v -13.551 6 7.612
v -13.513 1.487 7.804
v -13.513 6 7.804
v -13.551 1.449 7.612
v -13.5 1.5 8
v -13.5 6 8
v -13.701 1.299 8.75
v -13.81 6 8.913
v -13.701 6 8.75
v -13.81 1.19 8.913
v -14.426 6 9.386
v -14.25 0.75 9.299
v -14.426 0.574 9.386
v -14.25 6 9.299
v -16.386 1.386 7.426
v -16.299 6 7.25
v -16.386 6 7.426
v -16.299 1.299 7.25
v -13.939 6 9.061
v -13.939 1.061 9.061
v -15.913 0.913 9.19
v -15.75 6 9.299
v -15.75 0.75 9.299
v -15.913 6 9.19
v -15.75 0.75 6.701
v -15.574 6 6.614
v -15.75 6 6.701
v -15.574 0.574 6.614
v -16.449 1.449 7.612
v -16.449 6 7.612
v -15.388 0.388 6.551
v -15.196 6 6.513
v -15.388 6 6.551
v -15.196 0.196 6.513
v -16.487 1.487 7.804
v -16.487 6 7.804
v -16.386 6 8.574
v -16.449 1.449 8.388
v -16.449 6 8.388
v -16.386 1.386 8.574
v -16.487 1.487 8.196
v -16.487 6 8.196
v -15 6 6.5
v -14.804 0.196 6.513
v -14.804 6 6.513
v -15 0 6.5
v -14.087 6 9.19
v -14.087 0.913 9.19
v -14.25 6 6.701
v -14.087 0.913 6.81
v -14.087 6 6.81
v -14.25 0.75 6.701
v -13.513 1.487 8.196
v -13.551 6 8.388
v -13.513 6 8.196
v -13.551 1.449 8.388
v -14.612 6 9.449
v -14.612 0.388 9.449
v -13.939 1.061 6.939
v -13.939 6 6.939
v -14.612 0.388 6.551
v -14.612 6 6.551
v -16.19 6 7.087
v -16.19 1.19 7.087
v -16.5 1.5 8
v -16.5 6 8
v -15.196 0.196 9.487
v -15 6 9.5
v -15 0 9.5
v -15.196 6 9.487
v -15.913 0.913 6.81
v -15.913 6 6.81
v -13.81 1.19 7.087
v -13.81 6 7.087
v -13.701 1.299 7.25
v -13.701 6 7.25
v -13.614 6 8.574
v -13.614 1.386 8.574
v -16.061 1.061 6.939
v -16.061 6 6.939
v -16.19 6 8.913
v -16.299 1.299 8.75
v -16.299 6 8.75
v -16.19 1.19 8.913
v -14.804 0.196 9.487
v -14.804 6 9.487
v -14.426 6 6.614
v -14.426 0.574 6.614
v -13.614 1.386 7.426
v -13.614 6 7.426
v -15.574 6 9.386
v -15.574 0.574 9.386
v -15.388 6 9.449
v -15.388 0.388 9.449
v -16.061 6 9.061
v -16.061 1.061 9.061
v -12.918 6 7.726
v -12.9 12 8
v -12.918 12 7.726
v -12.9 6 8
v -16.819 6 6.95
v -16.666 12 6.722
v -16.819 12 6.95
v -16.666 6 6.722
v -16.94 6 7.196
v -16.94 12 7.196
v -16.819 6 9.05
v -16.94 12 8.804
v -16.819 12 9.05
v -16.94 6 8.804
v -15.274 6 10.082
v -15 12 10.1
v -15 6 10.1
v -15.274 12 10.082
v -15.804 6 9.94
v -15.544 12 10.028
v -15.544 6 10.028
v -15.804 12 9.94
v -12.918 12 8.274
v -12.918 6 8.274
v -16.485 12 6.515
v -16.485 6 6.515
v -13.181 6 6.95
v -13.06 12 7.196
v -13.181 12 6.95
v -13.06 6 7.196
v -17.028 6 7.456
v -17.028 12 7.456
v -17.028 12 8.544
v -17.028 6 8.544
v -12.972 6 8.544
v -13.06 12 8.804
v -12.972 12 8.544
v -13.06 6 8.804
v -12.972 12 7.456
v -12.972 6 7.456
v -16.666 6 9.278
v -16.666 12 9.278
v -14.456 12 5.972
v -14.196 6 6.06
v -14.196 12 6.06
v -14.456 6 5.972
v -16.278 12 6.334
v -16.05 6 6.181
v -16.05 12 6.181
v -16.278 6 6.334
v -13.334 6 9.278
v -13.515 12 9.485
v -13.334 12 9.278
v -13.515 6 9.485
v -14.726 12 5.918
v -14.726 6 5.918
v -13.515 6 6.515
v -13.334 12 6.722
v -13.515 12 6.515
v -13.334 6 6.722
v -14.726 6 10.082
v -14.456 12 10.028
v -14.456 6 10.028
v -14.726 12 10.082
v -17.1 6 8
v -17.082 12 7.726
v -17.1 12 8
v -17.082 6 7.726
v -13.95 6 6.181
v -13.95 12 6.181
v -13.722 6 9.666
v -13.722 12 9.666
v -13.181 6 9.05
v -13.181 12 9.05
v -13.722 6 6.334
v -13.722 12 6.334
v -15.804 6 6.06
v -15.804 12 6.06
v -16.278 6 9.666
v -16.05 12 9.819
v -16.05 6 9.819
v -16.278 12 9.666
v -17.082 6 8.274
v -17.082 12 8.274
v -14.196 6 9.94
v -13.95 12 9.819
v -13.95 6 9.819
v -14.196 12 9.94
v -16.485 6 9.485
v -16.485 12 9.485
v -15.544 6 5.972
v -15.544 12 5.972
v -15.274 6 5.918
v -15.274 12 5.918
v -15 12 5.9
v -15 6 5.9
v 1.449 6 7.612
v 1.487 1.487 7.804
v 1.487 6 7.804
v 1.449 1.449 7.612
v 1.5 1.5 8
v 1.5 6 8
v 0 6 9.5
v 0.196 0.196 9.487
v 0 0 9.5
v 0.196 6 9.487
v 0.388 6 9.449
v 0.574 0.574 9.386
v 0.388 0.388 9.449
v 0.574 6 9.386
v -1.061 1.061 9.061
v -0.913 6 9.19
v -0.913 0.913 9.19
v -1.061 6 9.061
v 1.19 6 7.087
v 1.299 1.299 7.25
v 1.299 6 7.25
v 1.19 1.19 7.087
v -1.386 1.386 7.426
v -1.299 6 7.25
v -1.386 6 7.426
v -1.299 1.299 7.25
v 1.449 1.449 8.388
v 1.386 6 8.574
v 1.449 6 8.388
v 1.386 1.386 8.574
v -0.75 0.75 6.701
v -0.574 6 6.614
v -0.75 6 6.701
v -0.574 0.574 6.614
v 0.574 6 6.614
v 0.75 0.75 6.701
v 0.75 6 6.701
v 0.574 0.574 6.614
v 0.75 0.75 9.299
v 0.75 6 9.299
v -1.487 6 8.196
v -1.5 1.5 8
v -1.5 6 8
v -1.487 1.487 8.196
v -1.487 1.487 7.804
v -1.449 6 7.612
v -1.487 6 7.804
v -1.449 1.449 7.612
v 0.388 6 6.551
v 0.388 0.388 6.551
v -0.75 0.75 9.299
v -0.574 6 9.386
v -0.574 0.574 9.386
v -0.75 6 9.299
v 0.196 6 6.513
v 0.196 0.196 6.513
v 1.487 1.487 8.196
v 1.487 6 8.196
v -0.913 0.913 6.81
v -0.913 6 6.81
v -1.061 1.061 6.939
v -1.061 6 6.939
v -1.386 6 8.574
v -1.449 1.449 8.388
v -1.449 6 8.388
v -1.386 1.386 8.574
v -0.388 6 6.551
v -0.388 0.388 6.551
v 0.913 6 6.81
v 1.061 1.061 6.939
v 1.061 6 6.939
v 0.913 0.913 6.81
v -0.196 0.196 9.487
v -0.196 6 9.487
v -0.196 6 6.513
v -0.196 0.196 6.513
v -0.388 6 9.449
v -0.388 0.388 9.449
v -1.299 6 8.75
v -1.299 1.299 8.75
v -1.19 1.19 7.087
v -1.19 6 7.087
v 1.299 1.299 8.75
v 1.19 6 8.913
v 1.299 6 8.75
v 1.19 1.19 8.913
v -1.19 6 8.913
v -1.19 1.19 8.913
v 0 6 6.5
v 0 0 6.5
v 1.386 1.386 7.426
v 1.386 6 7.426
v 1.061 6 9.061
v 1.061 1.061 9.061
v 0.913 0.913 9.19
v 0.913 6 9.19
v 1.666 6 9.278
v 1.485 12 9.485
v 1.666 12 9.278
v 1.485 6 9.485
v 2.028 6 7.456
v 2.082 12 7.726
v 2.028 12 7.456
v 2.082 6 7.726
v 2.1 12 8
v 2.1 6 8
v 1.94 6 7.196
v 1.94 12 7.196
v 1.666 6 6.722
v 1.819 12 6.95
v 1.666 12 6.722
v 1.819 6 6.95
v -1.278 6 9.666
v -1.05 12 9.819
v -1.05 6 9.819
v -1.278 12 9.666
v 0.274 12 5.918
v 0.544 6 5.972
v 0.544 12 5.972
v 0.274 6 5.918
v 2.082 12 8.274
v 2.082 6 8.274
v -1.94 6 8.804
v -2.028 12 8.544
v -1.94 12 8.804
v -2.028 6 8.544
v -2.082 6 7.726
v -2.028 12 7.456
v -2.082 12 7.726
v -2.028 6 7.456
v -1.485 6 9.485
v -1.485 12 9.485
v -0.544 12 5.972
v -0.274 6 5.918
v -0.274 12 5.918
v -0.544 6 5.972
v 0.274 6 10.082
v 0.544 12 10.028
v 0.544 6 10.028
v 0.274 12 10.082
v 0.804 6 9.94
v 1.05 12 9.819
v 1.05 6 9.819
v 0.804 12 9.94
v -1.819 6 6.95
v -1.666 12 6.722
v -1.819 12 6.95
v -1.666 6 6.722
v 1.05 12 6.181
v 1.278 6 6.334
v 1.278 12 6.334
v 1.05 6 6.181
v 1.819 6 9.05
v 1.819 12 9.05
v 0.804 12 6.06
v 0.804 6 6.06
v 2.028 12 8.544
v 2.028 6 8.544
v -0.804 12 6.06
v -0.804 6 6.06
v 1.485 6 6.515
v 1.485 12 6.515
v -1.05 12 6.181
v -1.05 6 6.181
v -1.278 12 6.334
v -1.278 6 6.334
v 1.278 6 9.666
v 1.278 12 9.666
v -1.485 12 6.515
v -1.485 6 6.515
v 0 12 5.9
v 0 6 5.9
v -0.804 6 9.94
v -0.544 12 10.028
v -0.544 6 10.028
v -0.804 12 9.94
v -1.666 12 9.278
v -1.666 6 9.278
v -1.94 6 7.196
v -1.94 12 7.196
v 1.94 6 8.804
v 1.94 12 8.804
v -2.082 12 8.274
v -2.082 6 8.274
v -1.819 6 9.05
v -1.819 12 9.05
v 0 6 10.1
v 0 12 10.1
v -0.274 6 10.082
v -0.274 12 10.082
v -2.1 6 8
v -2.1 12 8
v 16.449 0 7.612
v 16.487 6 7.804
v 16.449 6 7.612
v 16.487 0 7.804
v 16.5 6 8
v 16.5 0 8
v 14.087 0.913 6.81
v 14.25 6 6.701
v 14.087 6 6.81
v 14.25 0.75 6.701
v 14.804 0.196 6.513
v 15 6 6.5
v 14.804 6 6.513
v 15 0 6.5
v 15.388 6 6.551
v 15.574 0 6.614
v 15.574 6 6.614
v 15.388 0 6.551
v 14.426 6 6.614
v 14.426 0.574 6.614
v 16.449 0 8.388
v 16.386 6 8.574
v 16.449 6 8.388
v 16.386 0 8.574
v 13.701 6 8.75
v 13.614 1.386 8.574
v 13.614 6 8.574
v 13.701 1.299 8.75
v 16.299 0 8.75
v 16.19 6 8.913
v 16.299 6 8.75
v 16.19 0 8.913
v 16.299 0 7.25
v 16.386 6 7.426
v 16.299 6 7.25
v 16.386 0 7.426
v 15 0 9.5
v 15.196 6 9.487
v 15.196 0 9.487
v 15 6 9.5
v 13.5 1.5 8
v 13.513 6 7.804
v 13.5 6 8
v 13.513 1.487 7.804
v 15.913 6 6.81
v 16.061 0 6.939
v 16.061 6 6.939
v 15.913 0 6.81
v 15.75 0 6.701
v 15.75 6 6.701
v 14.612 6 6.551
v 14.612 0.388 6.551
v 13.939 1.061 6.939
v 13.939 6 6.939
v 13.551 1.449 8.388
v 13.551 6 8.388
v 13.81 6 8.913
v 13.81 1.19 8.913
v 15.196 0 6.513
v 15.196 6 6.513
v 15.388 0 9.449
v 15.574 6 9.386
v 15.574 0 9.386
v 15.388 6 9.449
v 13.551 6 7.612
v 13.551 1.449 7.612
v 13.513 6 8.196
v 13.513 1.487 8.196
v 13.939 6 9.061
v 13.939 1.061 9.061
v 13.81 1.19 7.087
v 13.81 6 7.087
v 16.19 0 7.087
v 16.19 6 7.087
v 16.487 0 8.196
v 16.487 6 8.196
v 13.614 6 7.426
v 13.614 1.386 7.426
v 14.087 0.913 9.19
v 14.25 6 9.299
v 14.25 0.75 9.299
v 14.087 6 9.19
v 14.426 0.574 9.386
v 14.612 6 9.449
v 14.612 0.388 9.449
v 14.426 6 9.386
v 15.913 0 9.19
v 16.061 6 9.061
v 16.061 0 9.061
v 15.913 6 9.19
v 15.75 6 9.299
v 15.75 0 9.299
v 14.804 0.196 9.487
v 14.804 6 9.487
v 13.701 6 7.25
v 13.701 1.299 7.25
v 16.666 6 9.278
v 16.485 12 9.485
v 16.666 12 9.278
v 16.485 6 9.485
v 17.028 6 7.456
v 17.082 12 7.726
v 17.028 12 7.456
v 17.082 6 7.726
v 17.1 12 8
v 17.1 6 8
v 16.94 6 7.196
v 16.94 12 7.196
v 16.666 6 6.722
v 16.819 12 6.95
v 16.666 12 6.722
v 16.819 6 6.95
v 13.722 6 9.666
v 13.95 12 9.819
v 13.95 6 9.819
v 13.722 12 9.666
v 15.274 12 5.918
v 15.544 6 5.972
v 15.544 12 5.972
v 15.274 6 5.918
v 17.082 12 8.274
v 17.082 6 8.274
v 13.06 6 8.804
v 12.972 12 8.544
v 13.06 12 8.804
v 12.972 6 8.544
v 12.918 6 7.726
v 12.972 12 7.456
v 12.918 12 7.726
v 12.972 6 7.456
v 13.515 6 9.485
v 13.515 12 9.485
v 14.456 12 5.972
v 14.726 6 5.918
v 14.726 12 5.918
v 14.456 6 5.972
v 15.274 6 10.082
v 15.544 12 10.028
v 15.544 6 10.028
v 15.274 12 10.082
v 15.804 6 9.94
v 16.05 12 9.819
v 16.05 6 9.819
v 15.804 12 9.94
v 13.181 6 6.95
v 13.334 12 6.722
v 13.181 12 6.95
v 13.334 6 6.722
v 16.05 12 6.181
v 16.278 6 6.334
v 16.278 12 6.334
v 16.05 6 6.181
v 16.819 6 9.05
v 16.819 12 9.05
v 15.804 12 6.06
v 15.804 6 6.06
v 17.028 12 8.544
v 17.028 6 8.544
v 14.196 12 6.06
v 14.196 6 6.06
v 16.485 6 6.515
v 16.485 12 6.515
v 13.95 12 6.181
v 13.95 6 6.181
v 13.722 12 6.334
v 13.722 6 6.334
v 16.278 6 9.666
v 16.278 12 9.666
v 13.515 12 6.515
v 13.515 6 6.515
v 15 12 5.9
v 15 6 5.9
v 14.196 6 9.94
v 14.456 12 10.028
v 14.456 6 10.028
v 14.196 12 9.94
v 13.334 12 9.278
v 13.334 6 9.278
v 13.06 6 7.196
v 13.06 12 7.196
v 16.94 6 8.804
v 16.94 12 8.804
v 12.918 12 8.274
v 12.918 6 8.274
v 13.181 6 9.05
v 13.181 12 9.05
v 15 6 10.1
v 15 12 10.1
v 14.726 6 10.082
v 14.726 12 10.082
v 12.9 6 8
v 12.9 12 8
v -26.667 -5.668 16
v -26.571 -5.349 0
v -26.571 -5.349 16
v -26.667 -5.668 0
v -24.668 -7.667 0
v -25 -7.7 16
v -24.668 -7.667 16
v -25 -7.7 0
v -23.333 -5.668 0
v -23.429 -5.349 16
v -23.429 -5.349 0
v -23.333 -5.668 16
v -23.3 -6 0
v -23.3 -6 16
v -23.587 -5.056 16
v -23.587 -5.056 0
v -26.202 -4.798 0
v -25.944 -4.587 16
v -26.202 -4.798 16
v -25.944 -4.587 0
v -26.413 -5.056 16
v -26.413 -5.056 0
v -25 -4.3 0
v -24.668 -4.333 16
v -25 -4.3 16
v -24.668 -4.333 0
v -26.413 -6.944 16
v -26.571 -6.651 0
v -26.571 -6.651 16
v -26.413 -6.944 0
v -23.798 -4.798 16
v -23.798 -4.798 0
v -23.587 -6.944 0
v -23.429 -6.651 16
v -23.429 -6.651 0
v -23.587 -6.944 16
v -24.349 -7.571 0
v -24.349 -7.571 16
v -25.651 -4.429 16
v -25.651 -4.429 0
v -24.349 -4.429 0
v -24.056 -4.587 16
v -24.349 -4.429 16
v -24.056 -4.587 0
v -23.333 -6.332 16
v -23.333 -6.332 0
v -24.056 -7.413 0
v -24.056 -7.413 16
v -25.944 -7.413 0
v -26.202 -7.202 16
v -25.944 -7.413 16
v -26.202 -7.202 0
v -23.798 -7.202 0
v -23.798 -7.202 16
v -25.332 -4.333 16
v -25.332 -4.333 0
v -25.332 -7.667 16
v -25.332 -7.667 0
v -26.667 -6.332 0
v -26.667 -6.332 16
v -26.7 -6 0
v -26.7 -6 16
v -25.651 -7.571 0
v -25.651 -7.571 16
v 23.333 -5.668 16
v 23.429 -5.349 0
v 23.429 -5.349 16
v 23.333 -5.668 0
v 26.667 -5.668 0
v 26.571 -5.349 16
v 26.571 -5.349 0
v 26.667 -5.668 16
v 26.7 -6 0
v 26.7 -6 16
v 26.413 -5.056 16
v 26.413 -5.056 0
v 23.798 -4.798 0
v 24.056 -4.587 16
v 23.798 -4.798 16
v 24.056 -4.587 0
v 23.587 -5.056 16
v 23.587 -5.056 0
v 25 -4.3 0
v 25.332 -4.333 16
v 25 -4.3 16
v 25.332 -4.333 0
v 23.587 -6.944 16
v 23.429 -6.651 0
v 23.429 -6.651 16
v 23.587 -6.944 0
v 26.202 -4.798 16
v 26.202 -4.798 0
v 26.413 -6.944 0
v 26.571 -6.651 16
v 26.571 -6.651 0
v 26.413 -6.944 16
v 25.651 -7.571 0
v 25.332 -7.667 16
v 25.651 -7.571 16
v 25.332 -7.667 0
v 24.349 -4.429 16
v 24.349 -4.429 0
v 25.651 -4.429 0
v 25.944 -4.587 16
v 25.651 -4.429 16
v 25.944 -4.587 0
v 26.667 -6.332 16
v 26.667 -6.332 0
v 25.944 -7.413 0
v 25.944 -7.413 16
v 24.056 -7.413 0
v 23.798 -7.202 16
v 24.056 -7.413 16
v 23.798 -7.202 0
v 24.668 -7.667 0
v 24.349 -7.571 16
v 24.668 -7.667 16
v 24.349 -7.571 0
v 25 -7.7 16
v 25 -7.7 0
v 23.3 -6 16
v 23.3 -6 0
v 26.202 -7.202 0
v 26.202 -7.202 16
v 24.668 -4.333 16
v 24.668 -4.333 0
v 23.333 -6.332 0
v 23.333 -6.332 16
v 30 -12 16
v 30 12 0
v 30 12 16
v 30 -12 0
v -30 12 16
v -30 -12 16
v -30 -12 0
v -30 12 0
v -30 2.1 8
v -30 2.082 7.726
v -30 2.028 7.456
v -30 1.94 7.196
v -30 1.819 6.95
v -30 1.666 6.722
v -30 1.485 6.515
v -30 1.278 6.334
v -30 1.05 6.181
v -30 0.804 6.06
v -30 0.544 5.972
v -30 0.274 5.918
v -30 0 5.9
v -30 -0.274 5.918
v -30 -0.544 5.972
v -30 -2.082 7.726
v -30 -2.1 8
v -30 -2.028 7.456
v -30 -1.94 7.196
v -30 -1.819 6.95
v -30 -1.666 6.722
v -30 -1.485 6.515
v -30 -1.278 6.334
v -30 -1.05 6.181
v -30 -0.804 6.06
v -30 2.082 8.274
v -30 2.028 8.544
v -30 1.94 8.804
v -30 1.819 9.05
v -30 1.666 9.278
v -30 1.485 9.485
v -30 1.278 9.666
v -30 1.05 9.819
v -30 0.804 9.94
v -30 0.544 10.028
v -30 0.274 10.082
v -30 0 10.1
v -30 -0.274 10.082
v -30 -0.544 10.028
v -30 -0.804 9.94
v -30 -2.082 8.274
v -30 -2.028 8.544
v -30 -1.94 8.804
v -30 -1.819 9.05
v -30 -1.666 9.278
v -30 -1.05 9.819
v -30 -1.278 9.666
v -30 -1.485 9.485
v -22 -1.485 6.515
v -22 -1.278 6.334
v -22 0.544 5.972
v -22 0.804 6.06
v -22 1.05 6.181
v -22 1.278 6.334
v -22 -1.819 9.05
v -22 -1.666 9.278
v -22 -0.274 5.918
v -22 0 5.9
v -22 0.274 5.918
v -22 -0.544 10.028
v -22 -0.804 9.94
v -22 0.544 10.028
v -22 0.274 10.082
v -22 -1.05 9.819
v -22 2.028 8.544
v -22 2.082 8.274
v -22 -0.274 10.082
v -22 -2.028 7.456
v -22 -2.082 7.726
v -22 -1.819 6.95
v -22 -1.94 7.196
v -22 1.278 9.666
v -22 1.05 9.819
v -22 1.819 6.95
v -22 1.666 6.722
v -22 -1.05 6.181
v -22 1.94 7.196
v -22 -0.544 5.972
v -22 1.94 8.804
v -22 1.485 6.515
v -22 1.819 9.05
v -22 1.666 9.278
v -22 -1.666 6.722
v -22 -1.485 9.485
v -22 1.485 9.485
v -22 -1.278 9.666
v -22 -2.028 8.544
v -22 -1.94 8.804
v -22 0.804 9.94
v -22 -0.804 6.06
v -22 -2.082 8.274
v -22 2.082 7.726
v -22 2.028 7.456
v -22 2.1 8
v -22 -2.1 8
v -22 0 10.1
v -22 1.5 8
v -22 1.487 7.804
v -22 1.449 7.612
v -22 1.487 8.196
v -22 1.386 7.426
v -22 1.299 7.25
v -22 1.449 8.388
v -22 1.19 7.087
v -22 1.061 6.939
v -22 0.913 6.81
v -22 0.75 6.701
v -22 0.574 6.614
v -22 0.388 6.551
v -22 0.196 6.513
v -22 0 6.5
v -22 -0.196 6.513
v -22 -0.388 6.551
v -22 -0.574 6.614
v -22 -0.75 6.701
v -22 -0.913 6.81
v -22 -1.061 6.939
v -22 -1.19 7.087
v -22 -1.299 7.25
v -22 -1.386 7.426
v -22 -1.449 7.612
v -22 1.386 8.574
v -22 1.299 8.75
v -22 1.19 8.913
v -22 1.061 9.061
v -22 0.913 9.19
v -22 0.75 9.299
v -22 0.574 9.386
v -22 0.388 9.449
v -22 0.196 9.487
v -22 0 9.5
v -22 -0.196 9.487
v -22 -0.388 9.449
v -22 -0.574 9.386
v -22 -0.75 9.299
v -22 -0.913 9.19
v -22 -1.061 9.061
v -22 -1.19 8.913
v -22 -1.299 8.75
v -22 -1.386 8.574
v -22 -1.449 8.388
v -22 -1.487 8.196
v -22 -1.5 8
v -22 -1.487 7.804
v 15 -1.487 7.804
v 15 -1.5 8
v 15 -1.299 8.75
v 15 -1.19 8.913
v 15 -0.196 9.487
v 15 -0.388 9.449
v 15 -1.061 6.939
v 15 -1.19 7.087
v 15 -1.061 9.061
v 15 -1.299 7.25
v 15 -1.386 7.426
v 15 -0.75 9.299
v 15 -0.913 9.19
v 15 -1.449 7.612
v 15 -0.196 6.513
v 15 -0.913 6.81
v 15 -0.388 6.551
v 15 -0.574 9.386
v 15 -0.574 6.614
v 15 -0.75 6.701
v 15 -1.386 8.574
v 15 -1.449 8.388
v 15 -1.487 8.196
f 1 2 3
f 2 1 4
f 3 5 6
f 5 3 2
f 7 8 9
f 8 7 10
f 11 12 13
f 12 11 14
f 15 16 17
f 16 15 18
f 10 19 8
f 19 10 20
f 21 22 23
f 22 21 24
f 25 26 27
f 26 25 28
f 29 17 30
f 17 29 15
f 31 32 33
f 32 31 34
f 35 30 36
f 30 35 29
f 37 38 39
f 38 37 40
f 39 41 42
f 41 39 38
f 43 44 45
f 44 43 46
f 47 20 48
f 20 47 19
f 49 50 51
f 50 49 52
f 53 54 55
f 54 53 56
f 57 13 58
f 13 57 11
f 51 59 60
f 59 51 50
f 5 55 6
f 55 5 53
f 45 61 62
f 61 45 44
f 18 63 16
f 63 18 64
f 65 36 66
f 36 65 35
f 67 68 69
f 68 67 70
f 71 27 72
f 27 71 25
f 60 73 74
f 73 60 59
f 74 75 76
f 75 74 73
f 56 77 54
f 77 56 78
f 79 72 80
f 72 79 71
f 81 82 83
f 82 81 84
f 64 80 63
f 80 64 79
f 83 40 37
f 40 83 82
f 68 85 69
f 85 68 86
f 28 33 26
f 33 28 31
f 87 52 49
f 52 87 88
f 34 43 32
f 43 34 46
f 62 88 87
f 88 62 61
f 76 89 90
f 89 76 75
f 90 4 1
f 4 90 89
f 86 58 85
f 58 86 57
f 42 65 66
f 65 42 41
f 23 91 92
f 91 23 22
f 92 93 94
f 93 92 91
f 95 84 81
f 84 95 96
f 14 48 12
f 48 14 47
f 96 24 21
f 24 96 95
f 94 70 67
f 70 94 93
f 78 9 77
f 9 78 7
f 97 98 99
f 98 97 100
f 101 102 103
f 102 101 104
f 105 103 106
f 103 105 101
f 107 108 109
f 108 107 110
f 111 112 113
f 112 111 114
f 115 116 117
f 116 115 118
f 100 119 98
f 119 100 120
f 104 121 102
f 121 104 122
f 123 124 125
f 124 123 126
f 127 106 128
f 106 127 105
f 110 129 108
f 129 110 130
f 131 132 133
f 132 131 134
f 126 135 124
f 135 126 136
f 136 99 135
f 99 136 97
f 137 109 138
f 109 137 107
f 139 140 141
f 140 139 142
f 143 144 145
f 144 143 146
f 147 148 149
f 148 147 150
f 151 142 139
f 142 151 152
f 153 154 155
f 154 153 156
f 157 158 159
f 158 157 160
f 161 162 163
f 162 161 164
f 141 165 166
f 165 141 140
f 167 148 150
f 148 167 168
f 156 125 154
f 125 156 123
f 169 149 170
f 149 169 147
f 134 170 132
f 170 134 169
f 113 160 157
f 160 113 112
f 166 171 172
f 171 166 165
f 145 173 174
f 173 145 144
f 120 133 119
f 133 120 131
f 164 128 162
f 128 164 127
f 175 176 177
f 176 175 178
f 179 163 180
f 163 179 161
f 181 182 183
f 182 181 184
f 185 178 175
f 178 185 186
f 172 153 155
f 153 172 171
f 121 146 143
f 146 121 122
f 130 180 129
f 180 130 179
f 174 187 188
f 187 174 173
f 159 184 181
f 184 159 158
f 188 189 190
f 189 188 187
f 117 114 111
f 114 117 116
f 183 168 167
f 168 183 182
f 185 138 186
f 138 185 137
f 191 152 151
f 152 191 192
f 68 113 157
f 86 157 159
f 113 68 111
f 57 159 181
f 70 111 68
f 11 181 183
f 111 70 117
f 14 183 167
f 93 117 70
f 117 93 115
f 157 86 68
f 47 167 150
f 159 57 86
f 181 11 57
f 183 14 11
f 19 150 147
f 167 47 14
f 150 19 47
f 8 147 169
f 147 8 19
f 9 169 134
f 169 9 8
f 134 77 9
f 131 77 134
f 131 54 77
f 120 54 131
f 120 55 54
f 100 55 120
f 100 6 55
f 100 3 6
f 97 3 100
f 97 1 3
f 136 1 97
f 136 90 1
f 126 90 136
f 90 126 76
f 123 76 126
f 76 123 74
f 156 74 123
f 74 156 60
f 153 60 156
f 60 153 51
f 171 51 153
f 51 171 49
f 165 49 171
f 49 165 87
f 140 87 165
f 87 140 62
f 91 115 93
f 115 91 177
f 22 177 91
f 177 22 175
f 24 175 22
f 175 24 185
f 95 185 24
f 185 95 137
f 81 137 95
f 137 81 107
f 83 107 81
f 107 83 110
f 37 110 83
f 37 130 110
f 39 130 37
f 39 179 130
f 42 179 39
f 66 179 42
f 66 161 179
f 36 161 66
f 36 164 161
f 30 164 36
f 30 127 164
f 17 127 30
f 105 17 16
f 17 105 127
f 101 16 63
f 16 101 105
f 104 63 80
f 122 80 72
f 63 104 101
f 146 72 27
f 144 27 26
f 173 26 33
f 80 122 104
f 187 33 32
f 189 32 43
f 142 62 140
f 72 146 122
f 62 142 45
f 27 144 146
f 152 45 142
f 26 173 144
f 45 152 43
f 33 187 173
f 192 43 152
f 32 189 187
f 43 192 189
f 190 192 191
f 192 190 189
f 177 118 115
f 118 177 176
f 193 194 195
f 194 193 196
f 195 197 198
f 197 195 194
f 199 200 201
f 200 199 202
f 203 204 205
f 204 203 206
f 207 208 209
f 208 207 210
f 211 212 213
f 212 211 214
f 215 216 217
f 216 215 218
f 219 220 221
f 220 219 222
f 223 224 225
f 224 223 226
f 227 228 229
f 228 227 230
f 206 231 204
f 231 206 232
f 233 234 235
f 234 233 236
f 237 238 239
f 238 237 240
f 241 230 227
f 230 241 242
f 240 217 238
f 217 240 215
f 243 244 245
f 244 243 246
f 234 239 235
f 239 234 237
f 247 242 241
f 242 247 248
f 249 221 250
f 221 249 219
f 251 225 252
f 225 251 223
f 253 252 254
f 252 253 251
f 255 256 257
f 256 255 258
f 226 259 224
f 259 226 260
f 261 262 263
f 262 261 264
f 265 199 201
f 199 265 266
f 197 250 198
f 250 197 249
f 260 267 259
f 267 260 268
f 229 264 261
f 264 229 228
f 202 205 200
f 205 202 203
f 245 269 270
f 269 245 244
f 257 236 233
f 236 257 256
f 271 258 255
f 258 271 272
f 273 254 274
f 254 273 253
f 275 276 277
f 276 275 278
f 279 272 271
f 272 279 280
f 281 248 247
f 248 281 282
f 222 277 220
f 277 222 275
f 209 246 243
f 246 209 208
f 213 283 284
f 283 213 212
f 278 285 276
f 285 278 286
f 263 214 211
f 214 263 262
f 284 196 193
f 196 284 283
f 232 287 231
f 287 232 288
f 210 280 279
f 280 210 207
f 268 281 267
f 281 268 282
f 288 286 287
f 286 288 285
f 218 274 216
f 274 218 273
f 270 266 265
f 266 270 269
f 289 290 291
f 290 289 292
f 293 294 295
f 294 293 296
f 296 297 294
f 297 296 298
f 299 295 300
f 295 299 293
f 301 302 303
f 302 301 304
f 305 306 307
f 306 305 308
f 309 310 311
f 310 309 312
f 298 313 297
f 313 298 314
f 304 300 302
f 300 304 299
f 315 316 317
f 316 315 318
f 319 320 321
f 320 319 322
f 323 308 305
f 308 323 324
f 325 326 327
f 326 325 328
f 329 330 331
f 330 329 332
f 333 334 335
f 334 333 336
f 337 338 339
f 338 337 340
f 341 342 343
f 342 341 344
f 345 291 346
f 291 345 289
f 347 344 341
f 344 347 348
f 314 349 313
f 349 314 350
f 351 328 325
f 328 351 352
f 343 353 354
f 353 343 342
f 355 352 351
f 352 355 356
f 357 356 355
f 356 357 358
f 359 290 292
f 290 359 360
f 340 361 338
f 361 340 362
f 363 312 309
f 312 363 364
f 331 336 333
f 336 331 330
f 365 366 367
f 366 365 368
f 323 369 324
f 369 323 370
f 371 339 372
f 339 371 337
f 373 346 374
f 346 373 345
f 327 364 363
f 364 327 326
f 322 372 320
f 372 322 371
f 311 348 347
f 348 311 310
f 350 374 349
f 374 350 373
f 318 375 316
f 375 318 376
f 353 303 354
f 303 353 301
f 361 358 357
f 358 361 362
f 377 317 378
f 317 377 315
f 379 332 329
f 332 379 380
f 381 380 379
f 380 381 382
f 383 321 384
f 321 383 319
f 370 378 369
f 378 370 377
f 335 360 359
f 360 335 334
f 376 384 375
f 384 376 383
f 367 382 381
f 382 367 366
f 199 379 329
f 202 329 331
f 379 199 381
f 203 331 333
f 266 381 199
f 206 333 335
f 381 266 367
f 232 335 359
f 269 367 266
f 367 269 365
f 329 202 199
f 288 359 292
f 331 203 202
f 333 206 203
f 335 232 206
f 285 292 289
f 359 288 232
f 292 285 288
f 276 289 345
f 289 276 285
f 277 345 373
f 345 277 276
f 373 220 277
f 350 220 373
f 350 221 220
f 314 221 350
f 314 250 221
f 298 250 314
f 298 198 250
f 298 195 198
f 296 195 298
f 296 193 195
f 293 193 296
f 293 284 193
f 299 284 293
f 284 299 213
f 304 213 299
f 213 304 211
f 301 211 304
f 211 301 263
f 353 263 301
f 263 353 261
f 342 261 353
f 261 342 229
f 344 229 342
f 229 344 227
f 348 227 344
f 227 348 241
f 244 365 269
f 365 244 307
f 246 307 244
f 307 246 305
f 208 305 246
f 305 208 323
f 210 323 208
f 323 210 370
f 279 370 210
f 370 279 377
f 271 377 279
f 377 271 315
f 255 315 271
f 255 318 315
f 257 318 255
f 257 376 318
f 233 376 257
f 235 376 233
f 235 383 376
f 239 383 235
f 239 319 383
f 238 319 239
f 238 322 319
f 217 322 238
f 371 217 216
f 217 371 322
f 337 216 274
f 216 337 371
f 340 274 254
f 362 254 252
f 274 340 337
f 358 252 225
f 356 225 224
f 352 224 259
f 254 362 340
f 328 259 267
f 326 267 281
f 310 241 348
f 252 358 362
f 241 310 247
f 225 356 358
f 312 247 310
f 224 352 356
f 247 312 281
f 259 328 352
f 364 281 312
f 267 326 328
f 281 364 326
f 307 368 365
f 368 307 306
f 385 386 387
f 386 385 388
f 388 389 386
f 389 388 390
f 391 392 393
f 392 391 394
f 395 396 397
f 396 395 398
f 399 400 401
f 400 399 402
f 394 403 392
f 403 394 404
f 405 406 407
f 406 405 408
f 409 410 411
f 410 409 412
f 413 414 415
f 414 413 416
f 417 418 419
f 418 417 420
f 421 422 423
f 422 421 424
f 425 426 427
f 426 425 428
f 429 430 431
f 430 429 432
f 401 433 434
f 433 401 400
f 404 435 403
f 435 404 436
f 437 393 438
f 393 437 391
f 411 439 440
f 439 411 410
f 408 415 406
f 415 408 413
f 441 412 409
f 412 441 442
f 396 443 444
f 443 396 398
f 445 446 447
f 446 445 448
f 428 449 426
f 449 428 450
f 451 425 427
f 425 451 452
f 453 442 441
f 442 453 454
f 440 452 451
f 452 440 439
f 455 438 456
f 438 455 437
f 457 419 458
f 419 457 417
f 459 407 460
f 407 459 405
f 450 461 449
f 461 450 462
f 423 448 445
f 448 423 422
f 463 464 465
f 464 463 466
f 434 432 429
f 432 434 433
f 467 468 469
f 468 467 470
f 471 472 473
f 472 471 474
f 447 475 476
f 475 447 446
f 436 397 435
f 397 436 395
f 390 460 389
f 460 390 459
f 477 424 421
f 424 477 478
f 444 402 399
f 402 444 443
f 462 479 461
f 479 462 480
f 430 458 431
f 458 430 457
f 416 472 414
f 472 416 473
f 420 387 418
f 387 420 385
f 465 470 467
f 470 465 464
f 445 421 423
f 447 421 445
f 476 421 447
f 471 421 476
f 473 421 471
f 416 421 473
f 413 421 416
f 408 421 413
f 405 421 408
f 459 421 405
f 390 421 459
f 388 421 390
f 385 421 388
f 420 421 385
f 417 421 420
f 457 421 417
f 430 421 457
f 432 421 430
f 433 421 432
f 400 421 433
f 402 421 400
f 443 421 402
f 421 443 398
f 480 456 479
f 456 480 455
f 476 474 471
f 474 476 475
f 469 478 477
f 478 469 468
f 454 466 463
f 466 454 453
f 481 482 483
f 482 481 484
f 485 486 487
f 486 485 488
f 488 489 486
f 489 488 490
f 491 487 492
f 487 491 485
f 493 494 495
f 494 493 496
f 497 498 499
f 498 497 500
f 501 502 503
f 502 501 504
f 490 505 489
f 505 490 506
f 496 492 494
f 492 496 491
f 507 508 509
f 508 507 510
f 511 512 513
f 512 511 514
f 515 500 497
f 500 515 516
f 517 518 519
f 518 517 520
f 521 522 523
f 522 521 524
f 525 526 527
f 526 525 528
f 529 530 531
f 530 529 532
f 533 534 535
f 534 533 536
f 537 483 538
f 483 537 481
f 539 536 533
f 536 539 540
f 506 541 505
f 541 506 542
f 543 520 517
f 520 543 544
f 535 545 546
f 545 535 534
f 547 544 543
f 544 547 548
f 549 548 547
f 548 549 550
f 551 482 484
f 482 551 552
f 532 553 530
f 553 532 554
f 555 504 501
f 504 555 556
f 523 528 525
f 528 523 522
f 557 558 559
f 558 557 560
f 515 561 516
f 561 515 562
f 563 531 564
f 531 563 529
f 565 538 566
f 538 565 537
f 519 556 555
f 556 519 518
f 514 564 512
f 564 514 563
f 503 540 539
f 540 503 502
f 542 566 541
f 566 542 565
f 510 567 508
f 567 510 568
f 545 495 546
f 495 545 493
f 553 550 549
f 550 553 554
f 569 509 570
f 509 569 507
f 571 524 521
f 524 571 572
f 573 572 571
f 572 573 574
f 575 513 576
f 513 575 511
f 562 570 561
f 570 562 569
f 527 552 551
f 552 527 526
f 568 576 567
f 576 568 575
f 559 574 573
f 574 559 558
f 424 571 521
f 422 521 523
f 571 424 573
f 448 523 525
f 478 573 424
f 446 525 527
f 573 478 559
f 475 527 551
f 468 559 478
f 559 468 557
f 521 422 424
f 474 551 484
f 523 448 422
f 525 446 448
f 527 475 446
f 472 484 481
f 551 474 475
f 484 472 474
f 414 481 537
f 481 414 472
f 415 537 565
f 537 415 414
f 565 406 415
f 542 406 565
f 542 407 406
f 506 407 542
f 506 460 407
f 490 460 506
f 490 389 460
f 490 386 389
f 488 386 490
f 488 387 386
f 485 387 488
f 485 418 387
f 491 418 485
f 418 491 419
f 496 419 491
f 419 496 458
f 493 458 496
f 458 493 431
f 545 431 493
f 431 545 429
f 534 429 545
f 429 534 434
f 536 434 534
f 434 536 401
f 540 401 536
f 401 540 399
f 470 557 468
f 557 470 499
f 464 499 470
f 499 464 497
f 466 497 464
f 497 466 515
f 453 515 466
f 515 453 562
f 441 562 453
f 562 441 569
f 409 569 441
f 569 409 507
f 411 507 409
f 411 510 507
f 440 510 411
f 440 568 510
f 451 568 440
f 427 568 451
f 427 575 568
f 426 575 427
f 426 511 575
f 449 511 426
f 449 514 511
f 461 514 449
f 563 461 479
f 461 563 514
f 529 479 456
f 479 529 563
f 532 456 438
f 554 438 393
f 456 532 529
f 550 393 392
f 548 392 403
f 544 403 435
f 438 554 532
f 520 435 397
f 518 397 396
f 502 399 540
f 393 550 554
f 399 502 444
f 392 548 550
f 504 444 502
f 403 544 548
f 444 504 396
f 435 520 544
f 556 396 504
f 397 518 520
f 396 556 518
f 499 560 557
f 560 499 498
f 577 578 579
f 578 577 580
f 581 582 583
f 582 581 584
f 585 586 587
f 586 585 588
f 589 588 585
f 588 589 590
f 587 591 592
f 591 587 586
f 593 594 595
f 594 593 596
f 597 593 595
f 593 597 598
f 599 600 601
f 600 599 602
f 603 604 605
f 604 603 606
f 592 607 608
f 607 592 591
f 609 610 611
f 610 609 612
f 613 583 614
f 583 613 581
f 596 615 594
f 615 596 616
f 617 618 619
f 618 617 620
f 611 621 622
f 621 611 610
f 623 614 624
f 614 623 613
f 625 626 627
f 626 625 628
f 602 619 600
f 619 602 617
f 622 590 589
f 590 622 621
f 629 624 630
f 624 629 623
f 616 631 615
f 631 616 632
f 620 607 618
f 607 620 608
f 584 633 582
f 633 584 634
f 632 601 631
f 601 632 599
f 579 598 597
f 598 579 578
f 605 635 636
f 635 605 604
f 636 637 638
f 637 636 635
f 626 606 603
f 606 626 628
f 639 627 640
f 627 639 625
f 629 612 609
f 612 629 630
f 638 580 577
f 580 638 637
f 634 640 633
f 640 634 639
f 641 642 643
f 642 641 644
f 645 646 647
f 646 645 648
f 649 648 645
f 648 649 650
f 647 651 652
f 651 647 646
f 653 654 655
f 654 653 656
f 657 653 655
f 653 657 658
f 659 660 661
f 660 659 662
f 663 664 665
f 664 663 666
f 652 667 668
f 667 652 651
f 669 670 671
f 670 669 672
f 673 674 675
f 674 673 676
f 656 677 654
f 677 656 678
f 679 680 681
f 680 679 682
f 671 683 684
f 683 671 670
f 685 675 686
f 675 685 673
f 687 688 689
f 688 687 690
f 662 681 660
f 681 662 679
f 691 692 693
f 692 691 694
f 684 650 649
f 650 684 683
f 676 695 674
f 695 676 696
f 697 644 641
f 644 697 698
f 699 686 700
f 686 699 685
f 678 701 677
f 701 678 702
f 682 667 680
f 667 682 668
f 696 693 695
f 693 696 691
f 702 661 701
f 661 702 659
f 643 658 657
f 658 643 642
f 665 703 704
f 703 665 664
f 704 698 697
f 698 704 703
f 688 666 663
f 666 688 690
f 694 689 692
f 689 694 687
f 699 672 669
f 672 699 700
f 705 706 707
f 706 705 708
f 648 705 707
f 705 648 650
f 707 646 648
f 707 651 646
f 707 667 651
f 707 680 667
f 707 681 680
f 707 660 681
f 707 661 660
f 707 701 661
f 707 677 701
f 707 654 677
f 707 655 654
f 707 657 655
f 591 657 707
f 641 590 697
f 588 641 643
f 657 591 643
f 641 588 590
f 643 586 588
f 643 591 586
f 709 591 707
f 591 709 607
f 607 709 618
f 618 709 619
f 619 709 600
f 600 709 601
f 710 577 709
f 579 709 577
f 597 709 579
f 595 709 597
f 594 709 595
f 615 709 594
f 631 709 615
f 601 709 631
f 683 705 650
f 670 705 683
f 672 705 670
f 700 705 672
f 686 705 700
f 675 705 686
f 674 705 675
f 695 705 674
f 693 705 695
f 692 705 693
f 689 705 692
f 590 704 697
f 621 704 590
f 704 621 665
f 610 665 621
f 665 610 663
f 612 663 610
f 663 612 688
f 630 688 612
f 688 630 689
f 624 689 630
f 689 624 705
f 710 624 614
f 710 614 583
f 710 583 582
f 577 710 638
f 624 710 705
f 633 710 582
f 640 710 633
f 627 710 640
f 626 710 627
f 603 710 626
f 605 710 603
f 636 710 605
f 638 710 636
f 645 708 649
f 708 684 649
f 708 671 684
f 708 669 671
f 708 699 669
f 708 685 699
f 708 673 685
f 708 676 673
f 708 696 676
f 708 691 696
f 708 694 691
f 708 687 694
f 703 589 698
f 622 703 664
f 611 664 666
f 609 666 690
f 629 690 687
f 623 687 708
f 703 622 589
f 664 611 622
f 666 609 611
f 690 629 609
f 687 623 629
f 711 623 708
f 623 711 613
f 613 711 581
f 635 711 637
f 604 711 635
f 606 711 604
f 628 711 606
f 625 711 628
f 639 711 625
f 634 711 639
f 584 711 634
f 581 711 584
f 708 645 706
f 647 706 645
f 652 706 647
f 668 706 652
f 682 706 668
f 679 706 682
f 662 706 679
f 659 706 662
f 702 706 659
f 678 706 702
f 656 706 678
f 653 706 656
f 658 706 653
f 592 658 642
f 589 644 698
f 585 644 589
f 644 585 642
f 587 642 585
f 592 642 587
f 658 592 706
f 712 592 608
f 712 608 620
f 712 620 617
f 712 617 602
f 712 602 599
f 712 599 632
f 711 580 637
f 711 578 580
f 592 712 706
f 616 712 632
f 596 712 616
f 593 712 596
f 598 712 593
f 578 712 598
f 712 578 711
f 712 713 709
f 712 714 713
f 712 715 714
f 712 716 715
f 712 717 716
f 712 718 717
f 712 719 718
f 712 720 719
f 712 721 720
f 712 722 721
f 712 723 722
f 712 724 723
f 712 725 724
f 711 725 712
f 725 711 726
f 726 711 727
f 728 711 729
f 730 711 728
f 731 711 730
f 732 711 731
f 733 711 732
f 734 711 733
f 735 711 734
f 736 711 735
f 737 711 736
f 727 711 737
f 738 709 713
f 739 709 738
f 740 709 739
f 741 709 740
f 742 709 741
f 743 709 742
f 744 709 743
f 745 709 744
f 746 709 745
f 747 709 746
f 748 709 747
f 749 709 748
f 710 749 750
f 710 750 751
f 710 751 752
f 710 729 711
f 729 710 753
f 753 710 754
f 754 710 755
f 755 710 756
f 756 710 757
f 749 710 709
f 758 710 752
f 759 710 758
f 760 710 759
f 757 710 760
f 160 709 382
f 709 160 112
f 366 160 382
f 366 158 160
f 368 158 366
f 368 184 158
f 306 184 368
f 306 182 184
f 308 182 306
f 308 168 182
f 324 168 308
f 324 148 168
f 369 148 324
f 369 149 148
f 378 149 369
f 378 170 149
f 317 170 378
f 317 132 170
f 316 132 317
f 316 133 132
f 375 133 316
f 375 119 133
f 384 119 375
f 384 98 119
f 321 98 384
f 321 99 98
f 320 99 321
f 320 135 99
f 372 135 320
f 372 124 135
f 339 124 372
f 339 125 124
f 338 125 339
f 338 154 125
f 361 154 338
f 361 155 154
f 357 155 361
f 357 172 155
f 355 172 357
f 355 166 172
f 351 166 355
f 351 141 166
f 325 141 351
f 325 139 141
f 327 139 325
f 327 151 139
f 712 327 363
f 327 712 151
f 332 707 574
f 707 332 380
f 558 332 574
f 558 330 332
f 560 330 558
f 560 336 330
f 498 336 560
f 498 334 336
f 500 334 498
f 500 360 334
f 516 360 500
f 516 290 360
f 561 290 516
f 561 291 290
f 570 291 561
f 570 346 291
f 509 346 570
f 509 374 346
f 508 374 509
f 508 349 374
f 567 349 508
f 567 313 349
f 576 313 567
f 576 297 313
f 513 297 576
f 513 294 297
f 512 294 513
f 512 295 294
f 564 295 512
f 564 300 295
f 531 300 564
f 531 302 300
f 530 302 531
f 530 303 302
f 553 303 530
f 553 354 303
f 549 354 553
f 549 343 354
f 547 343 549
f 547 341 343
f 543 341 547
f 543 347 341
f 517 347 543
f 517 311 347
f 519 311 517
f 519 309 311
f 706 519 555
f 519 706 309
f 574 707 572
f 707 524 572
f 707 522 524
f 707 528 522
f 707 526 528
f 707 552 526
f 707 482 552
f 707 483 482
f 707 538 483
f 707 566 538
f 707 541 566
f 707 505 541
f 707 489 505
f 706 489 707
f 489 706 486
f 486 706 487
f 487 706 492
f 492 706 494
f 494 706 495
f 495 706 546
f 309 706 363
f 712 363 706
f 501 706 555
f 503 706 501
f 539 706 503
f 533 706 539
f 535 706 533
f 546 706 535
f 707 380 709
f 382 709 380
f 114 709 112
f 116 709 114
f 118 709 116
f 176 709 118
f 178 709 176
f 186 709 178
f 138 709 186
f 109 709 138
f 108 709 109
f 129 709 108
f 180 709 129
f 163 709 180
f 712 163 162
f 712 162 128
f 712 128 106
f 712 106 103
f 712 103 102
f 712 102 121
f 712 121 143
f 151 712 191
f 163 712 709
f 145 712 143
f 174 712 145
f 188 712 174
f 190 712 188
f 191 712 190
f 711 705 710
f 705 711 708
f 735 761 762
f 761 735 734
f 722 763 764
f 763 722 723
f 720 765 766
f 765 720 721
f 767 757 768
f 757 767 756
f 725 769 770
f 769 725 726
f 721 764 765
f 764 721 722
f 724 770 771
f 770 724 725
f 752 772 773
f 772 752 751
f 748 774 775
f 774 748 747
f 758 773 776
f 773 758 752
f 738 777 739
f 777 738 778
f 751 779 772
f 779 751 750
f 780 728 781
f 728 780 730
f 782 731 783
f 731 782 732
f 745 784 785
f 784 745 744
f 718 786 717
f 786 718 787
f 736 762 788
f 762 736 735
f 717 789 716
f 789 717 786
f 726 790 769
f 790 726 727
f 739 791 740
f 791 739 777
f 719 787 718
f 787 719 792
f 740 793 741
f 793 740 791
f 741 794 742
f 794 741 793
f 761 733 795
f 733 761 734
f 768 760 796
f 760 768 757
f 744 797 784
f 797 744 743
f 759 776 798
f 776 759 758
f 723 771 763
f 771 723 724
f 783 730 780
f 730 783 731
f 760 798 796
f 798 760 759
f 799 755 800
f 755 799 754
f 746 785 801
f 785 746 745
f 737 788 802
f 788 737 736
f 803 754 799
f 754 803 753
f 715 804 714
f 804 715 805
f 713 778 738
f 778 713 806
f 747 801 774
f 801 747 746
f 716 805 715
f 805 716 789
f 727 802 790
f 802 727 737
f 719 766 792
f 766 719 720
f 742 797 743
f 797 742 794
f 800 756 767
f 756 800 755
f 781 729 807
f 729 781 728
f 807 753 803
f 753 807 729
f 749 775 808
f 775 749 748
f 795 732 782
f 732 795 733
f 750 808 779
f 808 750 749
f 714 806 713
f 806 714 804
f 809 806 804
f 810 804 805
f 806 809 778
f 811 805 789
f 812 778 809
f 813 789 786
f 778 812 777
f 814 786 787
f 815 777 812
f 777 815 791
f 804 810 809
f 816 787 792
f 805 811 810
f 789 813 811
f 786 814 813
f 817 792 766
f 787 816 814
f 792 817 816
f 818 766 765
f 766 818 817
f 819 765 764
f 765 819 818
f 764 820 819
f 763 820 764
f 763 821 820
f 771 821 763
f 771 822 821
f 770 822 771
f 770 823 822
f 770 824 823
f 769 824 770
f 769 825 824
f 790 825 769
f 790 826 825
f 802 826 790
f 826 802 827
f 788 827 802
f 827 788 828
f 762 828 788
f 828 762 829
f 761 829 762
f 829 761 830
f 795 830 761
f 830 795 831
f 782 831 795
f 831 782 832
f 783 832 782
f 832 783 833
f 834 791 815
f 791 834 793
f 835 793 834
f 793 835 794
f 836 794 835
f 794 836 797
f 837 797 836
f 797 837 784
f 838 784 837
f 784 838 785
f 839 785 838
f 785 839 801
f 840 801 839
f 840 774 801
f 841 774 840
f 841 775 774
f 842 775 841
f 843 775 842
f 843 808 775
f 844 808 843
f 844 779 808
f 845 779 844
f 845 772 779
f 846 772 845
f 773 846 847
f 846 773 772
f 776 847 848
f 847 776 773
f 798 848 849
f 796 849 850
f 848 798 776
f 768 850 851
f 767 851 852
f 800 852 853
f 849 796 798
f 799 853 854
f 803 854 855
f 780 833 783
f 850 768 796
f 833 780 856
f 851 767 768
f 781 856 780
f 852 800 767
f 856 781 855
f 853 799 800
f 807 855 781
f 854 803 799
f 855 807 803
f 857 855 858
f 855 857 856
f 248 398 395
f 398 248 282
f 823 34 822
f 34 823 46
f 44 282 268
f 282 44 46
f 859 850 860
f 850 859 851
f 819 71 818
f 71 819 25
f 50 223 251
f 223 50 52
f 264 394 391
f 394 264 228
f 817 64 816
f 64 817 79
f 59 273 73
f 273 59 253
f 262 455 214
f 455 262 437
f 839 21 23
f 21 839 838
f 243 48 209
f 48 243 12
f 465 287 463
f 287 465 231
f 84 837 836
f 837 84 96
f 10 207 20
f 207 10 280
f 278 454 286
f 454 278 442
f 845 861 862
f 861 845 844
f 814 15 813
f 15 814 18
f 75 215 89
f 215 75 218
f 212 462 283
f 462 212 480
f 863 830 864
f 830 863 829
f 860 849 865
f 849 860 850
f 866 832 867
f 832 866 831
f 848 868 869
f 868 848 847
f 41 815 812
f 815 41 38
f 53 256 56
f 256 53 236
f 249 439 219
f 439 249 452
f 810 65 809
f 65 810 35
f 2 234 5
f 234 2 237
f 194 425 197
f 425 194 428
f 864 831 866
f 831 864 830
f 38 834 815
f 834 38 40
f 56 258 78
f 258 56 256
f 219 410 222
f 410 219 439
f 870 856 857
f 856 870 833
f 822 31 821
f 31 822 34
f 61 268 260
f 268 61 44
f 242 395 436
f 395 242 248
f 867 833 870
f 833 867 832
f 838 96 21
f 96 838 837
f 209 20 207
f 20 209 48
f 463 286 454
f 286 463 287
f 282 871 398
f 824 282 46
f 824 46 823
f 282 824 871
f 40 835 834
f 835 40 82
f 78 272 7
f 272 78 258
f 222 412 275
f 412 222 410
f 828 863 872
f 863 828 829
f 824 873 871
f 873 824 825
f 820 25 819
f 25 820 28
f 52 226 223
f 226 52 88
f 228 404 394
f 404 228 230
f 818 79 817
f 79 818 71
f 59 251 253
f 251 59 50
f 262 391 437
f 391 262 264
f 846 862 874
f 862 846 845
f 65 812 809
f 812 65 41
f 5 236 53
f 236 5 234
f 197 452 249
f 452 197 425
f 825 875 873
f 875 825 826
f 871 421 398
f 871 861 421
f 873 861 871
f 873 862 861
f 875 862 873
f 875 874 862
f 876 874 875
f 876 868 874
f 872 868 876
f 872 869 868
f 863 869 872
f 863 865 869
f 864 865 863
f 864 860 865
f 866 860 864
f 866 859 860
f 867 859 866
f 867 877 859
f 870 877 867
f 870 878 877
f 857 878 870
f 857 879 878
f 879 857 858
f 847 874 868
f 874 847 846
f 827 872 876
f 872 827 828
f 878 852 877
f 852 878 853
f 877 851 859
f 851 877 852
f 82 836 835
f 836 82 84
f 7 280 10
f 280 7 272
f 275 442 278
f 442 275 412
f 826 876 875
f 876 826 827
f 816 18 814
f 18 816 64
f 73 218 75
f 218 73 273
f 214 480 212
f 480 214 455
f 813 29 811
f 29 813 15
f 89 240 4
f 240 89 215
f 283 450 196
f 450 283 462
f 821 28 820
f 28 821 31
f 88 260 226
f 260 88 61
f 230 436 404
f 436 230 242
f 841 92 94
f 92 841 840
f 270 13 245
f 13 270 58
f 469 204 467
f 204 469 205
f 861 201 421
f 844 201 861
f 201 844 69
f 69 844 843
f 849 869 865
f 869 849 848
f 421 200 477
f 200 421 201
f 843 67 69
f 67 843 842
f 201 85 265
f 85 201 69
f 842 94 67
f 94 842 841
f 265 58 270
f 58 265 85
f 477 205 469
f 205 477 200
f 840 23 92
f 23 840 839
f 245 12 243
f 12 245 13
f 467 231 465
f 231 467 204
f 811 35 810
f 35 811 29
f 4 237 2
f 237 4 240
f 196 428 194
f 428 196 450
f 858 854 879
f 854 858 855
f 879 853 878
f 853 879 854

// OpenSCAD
// Manifold block: one tubing inlet split into three outlets through internal channels
// Category: hardware. 3 mm channels in the mid-plane: an inlet socket on the -X face feeds a main
// channel that ends inside the block; three branches run to sockets on the +Y face.
// Print: PETG, lying on its bottom face, 0.15 mm layers, 100 % infill (watertight walls);
// the 3 mm channels bridge cleanly. Leak-test before use; glue the tubing into the sockets.
// SPDX-License-Identifier: CERN-OHL-P-2.0

/* [Manifold] */
block = [60, 24, 16];     // X, Y, Z [mm], centred in X and Y
ch_z = 8;                 // channel mid-plane
ch_d = 3;
sock_d = 4.2;             // socket for 4 mm OD tubing
inlet_sock = 8;           // inlet socket depth (from the -X face)
outlet_sock = 6;          // outlet socket depth (from the +Y face)
main_end = 15;            // the main channel stops at x = 15
outlets_x = [-15, 0, 15];
screw_d = 3.4;            // M3 clearance
screws = [[-25, -6], [25, -6]];

/* [Hidden] */
eps = 0.01;

difference() {
    translate([-block.x / 2, -block.y / 2, 0]) cube(block);
    // inlet socket and main channel along +X
    translate([-block.x / 2 - 1, 0, ch_z]) rotate([0, 90, 0]) cylinder(d = sock_d, h = inlet_sock + 1, $fn = 48);
    translate([-block.x / 2 - 1, 0, ch_z]) rotate([0, 90, 0]) cylinder(d = ch_d, h = block.x / 2 + main_end + 1, $fn = 48);
    // outlet branches along +Y, each ending in a socket
    for (x = outlets_x) {
        translate([x, 0, ch_z]) rotate([-90, 0, 0]) cylinder(d = ch_d, h = block.y / 2 + 1, $fn = 48);
        translate([x, block.y / 2 - outlet_sock, ch_z]) rotate([-90, 0, 0]) cylinder(d = sock_d, h = outlet_sock + 1, $fn = 48);
    }
    for (p = screws) translate([p.x, p.y, -1]) cylinder(d = screw_d, h = block.z + 2, $fn = 32);
}
